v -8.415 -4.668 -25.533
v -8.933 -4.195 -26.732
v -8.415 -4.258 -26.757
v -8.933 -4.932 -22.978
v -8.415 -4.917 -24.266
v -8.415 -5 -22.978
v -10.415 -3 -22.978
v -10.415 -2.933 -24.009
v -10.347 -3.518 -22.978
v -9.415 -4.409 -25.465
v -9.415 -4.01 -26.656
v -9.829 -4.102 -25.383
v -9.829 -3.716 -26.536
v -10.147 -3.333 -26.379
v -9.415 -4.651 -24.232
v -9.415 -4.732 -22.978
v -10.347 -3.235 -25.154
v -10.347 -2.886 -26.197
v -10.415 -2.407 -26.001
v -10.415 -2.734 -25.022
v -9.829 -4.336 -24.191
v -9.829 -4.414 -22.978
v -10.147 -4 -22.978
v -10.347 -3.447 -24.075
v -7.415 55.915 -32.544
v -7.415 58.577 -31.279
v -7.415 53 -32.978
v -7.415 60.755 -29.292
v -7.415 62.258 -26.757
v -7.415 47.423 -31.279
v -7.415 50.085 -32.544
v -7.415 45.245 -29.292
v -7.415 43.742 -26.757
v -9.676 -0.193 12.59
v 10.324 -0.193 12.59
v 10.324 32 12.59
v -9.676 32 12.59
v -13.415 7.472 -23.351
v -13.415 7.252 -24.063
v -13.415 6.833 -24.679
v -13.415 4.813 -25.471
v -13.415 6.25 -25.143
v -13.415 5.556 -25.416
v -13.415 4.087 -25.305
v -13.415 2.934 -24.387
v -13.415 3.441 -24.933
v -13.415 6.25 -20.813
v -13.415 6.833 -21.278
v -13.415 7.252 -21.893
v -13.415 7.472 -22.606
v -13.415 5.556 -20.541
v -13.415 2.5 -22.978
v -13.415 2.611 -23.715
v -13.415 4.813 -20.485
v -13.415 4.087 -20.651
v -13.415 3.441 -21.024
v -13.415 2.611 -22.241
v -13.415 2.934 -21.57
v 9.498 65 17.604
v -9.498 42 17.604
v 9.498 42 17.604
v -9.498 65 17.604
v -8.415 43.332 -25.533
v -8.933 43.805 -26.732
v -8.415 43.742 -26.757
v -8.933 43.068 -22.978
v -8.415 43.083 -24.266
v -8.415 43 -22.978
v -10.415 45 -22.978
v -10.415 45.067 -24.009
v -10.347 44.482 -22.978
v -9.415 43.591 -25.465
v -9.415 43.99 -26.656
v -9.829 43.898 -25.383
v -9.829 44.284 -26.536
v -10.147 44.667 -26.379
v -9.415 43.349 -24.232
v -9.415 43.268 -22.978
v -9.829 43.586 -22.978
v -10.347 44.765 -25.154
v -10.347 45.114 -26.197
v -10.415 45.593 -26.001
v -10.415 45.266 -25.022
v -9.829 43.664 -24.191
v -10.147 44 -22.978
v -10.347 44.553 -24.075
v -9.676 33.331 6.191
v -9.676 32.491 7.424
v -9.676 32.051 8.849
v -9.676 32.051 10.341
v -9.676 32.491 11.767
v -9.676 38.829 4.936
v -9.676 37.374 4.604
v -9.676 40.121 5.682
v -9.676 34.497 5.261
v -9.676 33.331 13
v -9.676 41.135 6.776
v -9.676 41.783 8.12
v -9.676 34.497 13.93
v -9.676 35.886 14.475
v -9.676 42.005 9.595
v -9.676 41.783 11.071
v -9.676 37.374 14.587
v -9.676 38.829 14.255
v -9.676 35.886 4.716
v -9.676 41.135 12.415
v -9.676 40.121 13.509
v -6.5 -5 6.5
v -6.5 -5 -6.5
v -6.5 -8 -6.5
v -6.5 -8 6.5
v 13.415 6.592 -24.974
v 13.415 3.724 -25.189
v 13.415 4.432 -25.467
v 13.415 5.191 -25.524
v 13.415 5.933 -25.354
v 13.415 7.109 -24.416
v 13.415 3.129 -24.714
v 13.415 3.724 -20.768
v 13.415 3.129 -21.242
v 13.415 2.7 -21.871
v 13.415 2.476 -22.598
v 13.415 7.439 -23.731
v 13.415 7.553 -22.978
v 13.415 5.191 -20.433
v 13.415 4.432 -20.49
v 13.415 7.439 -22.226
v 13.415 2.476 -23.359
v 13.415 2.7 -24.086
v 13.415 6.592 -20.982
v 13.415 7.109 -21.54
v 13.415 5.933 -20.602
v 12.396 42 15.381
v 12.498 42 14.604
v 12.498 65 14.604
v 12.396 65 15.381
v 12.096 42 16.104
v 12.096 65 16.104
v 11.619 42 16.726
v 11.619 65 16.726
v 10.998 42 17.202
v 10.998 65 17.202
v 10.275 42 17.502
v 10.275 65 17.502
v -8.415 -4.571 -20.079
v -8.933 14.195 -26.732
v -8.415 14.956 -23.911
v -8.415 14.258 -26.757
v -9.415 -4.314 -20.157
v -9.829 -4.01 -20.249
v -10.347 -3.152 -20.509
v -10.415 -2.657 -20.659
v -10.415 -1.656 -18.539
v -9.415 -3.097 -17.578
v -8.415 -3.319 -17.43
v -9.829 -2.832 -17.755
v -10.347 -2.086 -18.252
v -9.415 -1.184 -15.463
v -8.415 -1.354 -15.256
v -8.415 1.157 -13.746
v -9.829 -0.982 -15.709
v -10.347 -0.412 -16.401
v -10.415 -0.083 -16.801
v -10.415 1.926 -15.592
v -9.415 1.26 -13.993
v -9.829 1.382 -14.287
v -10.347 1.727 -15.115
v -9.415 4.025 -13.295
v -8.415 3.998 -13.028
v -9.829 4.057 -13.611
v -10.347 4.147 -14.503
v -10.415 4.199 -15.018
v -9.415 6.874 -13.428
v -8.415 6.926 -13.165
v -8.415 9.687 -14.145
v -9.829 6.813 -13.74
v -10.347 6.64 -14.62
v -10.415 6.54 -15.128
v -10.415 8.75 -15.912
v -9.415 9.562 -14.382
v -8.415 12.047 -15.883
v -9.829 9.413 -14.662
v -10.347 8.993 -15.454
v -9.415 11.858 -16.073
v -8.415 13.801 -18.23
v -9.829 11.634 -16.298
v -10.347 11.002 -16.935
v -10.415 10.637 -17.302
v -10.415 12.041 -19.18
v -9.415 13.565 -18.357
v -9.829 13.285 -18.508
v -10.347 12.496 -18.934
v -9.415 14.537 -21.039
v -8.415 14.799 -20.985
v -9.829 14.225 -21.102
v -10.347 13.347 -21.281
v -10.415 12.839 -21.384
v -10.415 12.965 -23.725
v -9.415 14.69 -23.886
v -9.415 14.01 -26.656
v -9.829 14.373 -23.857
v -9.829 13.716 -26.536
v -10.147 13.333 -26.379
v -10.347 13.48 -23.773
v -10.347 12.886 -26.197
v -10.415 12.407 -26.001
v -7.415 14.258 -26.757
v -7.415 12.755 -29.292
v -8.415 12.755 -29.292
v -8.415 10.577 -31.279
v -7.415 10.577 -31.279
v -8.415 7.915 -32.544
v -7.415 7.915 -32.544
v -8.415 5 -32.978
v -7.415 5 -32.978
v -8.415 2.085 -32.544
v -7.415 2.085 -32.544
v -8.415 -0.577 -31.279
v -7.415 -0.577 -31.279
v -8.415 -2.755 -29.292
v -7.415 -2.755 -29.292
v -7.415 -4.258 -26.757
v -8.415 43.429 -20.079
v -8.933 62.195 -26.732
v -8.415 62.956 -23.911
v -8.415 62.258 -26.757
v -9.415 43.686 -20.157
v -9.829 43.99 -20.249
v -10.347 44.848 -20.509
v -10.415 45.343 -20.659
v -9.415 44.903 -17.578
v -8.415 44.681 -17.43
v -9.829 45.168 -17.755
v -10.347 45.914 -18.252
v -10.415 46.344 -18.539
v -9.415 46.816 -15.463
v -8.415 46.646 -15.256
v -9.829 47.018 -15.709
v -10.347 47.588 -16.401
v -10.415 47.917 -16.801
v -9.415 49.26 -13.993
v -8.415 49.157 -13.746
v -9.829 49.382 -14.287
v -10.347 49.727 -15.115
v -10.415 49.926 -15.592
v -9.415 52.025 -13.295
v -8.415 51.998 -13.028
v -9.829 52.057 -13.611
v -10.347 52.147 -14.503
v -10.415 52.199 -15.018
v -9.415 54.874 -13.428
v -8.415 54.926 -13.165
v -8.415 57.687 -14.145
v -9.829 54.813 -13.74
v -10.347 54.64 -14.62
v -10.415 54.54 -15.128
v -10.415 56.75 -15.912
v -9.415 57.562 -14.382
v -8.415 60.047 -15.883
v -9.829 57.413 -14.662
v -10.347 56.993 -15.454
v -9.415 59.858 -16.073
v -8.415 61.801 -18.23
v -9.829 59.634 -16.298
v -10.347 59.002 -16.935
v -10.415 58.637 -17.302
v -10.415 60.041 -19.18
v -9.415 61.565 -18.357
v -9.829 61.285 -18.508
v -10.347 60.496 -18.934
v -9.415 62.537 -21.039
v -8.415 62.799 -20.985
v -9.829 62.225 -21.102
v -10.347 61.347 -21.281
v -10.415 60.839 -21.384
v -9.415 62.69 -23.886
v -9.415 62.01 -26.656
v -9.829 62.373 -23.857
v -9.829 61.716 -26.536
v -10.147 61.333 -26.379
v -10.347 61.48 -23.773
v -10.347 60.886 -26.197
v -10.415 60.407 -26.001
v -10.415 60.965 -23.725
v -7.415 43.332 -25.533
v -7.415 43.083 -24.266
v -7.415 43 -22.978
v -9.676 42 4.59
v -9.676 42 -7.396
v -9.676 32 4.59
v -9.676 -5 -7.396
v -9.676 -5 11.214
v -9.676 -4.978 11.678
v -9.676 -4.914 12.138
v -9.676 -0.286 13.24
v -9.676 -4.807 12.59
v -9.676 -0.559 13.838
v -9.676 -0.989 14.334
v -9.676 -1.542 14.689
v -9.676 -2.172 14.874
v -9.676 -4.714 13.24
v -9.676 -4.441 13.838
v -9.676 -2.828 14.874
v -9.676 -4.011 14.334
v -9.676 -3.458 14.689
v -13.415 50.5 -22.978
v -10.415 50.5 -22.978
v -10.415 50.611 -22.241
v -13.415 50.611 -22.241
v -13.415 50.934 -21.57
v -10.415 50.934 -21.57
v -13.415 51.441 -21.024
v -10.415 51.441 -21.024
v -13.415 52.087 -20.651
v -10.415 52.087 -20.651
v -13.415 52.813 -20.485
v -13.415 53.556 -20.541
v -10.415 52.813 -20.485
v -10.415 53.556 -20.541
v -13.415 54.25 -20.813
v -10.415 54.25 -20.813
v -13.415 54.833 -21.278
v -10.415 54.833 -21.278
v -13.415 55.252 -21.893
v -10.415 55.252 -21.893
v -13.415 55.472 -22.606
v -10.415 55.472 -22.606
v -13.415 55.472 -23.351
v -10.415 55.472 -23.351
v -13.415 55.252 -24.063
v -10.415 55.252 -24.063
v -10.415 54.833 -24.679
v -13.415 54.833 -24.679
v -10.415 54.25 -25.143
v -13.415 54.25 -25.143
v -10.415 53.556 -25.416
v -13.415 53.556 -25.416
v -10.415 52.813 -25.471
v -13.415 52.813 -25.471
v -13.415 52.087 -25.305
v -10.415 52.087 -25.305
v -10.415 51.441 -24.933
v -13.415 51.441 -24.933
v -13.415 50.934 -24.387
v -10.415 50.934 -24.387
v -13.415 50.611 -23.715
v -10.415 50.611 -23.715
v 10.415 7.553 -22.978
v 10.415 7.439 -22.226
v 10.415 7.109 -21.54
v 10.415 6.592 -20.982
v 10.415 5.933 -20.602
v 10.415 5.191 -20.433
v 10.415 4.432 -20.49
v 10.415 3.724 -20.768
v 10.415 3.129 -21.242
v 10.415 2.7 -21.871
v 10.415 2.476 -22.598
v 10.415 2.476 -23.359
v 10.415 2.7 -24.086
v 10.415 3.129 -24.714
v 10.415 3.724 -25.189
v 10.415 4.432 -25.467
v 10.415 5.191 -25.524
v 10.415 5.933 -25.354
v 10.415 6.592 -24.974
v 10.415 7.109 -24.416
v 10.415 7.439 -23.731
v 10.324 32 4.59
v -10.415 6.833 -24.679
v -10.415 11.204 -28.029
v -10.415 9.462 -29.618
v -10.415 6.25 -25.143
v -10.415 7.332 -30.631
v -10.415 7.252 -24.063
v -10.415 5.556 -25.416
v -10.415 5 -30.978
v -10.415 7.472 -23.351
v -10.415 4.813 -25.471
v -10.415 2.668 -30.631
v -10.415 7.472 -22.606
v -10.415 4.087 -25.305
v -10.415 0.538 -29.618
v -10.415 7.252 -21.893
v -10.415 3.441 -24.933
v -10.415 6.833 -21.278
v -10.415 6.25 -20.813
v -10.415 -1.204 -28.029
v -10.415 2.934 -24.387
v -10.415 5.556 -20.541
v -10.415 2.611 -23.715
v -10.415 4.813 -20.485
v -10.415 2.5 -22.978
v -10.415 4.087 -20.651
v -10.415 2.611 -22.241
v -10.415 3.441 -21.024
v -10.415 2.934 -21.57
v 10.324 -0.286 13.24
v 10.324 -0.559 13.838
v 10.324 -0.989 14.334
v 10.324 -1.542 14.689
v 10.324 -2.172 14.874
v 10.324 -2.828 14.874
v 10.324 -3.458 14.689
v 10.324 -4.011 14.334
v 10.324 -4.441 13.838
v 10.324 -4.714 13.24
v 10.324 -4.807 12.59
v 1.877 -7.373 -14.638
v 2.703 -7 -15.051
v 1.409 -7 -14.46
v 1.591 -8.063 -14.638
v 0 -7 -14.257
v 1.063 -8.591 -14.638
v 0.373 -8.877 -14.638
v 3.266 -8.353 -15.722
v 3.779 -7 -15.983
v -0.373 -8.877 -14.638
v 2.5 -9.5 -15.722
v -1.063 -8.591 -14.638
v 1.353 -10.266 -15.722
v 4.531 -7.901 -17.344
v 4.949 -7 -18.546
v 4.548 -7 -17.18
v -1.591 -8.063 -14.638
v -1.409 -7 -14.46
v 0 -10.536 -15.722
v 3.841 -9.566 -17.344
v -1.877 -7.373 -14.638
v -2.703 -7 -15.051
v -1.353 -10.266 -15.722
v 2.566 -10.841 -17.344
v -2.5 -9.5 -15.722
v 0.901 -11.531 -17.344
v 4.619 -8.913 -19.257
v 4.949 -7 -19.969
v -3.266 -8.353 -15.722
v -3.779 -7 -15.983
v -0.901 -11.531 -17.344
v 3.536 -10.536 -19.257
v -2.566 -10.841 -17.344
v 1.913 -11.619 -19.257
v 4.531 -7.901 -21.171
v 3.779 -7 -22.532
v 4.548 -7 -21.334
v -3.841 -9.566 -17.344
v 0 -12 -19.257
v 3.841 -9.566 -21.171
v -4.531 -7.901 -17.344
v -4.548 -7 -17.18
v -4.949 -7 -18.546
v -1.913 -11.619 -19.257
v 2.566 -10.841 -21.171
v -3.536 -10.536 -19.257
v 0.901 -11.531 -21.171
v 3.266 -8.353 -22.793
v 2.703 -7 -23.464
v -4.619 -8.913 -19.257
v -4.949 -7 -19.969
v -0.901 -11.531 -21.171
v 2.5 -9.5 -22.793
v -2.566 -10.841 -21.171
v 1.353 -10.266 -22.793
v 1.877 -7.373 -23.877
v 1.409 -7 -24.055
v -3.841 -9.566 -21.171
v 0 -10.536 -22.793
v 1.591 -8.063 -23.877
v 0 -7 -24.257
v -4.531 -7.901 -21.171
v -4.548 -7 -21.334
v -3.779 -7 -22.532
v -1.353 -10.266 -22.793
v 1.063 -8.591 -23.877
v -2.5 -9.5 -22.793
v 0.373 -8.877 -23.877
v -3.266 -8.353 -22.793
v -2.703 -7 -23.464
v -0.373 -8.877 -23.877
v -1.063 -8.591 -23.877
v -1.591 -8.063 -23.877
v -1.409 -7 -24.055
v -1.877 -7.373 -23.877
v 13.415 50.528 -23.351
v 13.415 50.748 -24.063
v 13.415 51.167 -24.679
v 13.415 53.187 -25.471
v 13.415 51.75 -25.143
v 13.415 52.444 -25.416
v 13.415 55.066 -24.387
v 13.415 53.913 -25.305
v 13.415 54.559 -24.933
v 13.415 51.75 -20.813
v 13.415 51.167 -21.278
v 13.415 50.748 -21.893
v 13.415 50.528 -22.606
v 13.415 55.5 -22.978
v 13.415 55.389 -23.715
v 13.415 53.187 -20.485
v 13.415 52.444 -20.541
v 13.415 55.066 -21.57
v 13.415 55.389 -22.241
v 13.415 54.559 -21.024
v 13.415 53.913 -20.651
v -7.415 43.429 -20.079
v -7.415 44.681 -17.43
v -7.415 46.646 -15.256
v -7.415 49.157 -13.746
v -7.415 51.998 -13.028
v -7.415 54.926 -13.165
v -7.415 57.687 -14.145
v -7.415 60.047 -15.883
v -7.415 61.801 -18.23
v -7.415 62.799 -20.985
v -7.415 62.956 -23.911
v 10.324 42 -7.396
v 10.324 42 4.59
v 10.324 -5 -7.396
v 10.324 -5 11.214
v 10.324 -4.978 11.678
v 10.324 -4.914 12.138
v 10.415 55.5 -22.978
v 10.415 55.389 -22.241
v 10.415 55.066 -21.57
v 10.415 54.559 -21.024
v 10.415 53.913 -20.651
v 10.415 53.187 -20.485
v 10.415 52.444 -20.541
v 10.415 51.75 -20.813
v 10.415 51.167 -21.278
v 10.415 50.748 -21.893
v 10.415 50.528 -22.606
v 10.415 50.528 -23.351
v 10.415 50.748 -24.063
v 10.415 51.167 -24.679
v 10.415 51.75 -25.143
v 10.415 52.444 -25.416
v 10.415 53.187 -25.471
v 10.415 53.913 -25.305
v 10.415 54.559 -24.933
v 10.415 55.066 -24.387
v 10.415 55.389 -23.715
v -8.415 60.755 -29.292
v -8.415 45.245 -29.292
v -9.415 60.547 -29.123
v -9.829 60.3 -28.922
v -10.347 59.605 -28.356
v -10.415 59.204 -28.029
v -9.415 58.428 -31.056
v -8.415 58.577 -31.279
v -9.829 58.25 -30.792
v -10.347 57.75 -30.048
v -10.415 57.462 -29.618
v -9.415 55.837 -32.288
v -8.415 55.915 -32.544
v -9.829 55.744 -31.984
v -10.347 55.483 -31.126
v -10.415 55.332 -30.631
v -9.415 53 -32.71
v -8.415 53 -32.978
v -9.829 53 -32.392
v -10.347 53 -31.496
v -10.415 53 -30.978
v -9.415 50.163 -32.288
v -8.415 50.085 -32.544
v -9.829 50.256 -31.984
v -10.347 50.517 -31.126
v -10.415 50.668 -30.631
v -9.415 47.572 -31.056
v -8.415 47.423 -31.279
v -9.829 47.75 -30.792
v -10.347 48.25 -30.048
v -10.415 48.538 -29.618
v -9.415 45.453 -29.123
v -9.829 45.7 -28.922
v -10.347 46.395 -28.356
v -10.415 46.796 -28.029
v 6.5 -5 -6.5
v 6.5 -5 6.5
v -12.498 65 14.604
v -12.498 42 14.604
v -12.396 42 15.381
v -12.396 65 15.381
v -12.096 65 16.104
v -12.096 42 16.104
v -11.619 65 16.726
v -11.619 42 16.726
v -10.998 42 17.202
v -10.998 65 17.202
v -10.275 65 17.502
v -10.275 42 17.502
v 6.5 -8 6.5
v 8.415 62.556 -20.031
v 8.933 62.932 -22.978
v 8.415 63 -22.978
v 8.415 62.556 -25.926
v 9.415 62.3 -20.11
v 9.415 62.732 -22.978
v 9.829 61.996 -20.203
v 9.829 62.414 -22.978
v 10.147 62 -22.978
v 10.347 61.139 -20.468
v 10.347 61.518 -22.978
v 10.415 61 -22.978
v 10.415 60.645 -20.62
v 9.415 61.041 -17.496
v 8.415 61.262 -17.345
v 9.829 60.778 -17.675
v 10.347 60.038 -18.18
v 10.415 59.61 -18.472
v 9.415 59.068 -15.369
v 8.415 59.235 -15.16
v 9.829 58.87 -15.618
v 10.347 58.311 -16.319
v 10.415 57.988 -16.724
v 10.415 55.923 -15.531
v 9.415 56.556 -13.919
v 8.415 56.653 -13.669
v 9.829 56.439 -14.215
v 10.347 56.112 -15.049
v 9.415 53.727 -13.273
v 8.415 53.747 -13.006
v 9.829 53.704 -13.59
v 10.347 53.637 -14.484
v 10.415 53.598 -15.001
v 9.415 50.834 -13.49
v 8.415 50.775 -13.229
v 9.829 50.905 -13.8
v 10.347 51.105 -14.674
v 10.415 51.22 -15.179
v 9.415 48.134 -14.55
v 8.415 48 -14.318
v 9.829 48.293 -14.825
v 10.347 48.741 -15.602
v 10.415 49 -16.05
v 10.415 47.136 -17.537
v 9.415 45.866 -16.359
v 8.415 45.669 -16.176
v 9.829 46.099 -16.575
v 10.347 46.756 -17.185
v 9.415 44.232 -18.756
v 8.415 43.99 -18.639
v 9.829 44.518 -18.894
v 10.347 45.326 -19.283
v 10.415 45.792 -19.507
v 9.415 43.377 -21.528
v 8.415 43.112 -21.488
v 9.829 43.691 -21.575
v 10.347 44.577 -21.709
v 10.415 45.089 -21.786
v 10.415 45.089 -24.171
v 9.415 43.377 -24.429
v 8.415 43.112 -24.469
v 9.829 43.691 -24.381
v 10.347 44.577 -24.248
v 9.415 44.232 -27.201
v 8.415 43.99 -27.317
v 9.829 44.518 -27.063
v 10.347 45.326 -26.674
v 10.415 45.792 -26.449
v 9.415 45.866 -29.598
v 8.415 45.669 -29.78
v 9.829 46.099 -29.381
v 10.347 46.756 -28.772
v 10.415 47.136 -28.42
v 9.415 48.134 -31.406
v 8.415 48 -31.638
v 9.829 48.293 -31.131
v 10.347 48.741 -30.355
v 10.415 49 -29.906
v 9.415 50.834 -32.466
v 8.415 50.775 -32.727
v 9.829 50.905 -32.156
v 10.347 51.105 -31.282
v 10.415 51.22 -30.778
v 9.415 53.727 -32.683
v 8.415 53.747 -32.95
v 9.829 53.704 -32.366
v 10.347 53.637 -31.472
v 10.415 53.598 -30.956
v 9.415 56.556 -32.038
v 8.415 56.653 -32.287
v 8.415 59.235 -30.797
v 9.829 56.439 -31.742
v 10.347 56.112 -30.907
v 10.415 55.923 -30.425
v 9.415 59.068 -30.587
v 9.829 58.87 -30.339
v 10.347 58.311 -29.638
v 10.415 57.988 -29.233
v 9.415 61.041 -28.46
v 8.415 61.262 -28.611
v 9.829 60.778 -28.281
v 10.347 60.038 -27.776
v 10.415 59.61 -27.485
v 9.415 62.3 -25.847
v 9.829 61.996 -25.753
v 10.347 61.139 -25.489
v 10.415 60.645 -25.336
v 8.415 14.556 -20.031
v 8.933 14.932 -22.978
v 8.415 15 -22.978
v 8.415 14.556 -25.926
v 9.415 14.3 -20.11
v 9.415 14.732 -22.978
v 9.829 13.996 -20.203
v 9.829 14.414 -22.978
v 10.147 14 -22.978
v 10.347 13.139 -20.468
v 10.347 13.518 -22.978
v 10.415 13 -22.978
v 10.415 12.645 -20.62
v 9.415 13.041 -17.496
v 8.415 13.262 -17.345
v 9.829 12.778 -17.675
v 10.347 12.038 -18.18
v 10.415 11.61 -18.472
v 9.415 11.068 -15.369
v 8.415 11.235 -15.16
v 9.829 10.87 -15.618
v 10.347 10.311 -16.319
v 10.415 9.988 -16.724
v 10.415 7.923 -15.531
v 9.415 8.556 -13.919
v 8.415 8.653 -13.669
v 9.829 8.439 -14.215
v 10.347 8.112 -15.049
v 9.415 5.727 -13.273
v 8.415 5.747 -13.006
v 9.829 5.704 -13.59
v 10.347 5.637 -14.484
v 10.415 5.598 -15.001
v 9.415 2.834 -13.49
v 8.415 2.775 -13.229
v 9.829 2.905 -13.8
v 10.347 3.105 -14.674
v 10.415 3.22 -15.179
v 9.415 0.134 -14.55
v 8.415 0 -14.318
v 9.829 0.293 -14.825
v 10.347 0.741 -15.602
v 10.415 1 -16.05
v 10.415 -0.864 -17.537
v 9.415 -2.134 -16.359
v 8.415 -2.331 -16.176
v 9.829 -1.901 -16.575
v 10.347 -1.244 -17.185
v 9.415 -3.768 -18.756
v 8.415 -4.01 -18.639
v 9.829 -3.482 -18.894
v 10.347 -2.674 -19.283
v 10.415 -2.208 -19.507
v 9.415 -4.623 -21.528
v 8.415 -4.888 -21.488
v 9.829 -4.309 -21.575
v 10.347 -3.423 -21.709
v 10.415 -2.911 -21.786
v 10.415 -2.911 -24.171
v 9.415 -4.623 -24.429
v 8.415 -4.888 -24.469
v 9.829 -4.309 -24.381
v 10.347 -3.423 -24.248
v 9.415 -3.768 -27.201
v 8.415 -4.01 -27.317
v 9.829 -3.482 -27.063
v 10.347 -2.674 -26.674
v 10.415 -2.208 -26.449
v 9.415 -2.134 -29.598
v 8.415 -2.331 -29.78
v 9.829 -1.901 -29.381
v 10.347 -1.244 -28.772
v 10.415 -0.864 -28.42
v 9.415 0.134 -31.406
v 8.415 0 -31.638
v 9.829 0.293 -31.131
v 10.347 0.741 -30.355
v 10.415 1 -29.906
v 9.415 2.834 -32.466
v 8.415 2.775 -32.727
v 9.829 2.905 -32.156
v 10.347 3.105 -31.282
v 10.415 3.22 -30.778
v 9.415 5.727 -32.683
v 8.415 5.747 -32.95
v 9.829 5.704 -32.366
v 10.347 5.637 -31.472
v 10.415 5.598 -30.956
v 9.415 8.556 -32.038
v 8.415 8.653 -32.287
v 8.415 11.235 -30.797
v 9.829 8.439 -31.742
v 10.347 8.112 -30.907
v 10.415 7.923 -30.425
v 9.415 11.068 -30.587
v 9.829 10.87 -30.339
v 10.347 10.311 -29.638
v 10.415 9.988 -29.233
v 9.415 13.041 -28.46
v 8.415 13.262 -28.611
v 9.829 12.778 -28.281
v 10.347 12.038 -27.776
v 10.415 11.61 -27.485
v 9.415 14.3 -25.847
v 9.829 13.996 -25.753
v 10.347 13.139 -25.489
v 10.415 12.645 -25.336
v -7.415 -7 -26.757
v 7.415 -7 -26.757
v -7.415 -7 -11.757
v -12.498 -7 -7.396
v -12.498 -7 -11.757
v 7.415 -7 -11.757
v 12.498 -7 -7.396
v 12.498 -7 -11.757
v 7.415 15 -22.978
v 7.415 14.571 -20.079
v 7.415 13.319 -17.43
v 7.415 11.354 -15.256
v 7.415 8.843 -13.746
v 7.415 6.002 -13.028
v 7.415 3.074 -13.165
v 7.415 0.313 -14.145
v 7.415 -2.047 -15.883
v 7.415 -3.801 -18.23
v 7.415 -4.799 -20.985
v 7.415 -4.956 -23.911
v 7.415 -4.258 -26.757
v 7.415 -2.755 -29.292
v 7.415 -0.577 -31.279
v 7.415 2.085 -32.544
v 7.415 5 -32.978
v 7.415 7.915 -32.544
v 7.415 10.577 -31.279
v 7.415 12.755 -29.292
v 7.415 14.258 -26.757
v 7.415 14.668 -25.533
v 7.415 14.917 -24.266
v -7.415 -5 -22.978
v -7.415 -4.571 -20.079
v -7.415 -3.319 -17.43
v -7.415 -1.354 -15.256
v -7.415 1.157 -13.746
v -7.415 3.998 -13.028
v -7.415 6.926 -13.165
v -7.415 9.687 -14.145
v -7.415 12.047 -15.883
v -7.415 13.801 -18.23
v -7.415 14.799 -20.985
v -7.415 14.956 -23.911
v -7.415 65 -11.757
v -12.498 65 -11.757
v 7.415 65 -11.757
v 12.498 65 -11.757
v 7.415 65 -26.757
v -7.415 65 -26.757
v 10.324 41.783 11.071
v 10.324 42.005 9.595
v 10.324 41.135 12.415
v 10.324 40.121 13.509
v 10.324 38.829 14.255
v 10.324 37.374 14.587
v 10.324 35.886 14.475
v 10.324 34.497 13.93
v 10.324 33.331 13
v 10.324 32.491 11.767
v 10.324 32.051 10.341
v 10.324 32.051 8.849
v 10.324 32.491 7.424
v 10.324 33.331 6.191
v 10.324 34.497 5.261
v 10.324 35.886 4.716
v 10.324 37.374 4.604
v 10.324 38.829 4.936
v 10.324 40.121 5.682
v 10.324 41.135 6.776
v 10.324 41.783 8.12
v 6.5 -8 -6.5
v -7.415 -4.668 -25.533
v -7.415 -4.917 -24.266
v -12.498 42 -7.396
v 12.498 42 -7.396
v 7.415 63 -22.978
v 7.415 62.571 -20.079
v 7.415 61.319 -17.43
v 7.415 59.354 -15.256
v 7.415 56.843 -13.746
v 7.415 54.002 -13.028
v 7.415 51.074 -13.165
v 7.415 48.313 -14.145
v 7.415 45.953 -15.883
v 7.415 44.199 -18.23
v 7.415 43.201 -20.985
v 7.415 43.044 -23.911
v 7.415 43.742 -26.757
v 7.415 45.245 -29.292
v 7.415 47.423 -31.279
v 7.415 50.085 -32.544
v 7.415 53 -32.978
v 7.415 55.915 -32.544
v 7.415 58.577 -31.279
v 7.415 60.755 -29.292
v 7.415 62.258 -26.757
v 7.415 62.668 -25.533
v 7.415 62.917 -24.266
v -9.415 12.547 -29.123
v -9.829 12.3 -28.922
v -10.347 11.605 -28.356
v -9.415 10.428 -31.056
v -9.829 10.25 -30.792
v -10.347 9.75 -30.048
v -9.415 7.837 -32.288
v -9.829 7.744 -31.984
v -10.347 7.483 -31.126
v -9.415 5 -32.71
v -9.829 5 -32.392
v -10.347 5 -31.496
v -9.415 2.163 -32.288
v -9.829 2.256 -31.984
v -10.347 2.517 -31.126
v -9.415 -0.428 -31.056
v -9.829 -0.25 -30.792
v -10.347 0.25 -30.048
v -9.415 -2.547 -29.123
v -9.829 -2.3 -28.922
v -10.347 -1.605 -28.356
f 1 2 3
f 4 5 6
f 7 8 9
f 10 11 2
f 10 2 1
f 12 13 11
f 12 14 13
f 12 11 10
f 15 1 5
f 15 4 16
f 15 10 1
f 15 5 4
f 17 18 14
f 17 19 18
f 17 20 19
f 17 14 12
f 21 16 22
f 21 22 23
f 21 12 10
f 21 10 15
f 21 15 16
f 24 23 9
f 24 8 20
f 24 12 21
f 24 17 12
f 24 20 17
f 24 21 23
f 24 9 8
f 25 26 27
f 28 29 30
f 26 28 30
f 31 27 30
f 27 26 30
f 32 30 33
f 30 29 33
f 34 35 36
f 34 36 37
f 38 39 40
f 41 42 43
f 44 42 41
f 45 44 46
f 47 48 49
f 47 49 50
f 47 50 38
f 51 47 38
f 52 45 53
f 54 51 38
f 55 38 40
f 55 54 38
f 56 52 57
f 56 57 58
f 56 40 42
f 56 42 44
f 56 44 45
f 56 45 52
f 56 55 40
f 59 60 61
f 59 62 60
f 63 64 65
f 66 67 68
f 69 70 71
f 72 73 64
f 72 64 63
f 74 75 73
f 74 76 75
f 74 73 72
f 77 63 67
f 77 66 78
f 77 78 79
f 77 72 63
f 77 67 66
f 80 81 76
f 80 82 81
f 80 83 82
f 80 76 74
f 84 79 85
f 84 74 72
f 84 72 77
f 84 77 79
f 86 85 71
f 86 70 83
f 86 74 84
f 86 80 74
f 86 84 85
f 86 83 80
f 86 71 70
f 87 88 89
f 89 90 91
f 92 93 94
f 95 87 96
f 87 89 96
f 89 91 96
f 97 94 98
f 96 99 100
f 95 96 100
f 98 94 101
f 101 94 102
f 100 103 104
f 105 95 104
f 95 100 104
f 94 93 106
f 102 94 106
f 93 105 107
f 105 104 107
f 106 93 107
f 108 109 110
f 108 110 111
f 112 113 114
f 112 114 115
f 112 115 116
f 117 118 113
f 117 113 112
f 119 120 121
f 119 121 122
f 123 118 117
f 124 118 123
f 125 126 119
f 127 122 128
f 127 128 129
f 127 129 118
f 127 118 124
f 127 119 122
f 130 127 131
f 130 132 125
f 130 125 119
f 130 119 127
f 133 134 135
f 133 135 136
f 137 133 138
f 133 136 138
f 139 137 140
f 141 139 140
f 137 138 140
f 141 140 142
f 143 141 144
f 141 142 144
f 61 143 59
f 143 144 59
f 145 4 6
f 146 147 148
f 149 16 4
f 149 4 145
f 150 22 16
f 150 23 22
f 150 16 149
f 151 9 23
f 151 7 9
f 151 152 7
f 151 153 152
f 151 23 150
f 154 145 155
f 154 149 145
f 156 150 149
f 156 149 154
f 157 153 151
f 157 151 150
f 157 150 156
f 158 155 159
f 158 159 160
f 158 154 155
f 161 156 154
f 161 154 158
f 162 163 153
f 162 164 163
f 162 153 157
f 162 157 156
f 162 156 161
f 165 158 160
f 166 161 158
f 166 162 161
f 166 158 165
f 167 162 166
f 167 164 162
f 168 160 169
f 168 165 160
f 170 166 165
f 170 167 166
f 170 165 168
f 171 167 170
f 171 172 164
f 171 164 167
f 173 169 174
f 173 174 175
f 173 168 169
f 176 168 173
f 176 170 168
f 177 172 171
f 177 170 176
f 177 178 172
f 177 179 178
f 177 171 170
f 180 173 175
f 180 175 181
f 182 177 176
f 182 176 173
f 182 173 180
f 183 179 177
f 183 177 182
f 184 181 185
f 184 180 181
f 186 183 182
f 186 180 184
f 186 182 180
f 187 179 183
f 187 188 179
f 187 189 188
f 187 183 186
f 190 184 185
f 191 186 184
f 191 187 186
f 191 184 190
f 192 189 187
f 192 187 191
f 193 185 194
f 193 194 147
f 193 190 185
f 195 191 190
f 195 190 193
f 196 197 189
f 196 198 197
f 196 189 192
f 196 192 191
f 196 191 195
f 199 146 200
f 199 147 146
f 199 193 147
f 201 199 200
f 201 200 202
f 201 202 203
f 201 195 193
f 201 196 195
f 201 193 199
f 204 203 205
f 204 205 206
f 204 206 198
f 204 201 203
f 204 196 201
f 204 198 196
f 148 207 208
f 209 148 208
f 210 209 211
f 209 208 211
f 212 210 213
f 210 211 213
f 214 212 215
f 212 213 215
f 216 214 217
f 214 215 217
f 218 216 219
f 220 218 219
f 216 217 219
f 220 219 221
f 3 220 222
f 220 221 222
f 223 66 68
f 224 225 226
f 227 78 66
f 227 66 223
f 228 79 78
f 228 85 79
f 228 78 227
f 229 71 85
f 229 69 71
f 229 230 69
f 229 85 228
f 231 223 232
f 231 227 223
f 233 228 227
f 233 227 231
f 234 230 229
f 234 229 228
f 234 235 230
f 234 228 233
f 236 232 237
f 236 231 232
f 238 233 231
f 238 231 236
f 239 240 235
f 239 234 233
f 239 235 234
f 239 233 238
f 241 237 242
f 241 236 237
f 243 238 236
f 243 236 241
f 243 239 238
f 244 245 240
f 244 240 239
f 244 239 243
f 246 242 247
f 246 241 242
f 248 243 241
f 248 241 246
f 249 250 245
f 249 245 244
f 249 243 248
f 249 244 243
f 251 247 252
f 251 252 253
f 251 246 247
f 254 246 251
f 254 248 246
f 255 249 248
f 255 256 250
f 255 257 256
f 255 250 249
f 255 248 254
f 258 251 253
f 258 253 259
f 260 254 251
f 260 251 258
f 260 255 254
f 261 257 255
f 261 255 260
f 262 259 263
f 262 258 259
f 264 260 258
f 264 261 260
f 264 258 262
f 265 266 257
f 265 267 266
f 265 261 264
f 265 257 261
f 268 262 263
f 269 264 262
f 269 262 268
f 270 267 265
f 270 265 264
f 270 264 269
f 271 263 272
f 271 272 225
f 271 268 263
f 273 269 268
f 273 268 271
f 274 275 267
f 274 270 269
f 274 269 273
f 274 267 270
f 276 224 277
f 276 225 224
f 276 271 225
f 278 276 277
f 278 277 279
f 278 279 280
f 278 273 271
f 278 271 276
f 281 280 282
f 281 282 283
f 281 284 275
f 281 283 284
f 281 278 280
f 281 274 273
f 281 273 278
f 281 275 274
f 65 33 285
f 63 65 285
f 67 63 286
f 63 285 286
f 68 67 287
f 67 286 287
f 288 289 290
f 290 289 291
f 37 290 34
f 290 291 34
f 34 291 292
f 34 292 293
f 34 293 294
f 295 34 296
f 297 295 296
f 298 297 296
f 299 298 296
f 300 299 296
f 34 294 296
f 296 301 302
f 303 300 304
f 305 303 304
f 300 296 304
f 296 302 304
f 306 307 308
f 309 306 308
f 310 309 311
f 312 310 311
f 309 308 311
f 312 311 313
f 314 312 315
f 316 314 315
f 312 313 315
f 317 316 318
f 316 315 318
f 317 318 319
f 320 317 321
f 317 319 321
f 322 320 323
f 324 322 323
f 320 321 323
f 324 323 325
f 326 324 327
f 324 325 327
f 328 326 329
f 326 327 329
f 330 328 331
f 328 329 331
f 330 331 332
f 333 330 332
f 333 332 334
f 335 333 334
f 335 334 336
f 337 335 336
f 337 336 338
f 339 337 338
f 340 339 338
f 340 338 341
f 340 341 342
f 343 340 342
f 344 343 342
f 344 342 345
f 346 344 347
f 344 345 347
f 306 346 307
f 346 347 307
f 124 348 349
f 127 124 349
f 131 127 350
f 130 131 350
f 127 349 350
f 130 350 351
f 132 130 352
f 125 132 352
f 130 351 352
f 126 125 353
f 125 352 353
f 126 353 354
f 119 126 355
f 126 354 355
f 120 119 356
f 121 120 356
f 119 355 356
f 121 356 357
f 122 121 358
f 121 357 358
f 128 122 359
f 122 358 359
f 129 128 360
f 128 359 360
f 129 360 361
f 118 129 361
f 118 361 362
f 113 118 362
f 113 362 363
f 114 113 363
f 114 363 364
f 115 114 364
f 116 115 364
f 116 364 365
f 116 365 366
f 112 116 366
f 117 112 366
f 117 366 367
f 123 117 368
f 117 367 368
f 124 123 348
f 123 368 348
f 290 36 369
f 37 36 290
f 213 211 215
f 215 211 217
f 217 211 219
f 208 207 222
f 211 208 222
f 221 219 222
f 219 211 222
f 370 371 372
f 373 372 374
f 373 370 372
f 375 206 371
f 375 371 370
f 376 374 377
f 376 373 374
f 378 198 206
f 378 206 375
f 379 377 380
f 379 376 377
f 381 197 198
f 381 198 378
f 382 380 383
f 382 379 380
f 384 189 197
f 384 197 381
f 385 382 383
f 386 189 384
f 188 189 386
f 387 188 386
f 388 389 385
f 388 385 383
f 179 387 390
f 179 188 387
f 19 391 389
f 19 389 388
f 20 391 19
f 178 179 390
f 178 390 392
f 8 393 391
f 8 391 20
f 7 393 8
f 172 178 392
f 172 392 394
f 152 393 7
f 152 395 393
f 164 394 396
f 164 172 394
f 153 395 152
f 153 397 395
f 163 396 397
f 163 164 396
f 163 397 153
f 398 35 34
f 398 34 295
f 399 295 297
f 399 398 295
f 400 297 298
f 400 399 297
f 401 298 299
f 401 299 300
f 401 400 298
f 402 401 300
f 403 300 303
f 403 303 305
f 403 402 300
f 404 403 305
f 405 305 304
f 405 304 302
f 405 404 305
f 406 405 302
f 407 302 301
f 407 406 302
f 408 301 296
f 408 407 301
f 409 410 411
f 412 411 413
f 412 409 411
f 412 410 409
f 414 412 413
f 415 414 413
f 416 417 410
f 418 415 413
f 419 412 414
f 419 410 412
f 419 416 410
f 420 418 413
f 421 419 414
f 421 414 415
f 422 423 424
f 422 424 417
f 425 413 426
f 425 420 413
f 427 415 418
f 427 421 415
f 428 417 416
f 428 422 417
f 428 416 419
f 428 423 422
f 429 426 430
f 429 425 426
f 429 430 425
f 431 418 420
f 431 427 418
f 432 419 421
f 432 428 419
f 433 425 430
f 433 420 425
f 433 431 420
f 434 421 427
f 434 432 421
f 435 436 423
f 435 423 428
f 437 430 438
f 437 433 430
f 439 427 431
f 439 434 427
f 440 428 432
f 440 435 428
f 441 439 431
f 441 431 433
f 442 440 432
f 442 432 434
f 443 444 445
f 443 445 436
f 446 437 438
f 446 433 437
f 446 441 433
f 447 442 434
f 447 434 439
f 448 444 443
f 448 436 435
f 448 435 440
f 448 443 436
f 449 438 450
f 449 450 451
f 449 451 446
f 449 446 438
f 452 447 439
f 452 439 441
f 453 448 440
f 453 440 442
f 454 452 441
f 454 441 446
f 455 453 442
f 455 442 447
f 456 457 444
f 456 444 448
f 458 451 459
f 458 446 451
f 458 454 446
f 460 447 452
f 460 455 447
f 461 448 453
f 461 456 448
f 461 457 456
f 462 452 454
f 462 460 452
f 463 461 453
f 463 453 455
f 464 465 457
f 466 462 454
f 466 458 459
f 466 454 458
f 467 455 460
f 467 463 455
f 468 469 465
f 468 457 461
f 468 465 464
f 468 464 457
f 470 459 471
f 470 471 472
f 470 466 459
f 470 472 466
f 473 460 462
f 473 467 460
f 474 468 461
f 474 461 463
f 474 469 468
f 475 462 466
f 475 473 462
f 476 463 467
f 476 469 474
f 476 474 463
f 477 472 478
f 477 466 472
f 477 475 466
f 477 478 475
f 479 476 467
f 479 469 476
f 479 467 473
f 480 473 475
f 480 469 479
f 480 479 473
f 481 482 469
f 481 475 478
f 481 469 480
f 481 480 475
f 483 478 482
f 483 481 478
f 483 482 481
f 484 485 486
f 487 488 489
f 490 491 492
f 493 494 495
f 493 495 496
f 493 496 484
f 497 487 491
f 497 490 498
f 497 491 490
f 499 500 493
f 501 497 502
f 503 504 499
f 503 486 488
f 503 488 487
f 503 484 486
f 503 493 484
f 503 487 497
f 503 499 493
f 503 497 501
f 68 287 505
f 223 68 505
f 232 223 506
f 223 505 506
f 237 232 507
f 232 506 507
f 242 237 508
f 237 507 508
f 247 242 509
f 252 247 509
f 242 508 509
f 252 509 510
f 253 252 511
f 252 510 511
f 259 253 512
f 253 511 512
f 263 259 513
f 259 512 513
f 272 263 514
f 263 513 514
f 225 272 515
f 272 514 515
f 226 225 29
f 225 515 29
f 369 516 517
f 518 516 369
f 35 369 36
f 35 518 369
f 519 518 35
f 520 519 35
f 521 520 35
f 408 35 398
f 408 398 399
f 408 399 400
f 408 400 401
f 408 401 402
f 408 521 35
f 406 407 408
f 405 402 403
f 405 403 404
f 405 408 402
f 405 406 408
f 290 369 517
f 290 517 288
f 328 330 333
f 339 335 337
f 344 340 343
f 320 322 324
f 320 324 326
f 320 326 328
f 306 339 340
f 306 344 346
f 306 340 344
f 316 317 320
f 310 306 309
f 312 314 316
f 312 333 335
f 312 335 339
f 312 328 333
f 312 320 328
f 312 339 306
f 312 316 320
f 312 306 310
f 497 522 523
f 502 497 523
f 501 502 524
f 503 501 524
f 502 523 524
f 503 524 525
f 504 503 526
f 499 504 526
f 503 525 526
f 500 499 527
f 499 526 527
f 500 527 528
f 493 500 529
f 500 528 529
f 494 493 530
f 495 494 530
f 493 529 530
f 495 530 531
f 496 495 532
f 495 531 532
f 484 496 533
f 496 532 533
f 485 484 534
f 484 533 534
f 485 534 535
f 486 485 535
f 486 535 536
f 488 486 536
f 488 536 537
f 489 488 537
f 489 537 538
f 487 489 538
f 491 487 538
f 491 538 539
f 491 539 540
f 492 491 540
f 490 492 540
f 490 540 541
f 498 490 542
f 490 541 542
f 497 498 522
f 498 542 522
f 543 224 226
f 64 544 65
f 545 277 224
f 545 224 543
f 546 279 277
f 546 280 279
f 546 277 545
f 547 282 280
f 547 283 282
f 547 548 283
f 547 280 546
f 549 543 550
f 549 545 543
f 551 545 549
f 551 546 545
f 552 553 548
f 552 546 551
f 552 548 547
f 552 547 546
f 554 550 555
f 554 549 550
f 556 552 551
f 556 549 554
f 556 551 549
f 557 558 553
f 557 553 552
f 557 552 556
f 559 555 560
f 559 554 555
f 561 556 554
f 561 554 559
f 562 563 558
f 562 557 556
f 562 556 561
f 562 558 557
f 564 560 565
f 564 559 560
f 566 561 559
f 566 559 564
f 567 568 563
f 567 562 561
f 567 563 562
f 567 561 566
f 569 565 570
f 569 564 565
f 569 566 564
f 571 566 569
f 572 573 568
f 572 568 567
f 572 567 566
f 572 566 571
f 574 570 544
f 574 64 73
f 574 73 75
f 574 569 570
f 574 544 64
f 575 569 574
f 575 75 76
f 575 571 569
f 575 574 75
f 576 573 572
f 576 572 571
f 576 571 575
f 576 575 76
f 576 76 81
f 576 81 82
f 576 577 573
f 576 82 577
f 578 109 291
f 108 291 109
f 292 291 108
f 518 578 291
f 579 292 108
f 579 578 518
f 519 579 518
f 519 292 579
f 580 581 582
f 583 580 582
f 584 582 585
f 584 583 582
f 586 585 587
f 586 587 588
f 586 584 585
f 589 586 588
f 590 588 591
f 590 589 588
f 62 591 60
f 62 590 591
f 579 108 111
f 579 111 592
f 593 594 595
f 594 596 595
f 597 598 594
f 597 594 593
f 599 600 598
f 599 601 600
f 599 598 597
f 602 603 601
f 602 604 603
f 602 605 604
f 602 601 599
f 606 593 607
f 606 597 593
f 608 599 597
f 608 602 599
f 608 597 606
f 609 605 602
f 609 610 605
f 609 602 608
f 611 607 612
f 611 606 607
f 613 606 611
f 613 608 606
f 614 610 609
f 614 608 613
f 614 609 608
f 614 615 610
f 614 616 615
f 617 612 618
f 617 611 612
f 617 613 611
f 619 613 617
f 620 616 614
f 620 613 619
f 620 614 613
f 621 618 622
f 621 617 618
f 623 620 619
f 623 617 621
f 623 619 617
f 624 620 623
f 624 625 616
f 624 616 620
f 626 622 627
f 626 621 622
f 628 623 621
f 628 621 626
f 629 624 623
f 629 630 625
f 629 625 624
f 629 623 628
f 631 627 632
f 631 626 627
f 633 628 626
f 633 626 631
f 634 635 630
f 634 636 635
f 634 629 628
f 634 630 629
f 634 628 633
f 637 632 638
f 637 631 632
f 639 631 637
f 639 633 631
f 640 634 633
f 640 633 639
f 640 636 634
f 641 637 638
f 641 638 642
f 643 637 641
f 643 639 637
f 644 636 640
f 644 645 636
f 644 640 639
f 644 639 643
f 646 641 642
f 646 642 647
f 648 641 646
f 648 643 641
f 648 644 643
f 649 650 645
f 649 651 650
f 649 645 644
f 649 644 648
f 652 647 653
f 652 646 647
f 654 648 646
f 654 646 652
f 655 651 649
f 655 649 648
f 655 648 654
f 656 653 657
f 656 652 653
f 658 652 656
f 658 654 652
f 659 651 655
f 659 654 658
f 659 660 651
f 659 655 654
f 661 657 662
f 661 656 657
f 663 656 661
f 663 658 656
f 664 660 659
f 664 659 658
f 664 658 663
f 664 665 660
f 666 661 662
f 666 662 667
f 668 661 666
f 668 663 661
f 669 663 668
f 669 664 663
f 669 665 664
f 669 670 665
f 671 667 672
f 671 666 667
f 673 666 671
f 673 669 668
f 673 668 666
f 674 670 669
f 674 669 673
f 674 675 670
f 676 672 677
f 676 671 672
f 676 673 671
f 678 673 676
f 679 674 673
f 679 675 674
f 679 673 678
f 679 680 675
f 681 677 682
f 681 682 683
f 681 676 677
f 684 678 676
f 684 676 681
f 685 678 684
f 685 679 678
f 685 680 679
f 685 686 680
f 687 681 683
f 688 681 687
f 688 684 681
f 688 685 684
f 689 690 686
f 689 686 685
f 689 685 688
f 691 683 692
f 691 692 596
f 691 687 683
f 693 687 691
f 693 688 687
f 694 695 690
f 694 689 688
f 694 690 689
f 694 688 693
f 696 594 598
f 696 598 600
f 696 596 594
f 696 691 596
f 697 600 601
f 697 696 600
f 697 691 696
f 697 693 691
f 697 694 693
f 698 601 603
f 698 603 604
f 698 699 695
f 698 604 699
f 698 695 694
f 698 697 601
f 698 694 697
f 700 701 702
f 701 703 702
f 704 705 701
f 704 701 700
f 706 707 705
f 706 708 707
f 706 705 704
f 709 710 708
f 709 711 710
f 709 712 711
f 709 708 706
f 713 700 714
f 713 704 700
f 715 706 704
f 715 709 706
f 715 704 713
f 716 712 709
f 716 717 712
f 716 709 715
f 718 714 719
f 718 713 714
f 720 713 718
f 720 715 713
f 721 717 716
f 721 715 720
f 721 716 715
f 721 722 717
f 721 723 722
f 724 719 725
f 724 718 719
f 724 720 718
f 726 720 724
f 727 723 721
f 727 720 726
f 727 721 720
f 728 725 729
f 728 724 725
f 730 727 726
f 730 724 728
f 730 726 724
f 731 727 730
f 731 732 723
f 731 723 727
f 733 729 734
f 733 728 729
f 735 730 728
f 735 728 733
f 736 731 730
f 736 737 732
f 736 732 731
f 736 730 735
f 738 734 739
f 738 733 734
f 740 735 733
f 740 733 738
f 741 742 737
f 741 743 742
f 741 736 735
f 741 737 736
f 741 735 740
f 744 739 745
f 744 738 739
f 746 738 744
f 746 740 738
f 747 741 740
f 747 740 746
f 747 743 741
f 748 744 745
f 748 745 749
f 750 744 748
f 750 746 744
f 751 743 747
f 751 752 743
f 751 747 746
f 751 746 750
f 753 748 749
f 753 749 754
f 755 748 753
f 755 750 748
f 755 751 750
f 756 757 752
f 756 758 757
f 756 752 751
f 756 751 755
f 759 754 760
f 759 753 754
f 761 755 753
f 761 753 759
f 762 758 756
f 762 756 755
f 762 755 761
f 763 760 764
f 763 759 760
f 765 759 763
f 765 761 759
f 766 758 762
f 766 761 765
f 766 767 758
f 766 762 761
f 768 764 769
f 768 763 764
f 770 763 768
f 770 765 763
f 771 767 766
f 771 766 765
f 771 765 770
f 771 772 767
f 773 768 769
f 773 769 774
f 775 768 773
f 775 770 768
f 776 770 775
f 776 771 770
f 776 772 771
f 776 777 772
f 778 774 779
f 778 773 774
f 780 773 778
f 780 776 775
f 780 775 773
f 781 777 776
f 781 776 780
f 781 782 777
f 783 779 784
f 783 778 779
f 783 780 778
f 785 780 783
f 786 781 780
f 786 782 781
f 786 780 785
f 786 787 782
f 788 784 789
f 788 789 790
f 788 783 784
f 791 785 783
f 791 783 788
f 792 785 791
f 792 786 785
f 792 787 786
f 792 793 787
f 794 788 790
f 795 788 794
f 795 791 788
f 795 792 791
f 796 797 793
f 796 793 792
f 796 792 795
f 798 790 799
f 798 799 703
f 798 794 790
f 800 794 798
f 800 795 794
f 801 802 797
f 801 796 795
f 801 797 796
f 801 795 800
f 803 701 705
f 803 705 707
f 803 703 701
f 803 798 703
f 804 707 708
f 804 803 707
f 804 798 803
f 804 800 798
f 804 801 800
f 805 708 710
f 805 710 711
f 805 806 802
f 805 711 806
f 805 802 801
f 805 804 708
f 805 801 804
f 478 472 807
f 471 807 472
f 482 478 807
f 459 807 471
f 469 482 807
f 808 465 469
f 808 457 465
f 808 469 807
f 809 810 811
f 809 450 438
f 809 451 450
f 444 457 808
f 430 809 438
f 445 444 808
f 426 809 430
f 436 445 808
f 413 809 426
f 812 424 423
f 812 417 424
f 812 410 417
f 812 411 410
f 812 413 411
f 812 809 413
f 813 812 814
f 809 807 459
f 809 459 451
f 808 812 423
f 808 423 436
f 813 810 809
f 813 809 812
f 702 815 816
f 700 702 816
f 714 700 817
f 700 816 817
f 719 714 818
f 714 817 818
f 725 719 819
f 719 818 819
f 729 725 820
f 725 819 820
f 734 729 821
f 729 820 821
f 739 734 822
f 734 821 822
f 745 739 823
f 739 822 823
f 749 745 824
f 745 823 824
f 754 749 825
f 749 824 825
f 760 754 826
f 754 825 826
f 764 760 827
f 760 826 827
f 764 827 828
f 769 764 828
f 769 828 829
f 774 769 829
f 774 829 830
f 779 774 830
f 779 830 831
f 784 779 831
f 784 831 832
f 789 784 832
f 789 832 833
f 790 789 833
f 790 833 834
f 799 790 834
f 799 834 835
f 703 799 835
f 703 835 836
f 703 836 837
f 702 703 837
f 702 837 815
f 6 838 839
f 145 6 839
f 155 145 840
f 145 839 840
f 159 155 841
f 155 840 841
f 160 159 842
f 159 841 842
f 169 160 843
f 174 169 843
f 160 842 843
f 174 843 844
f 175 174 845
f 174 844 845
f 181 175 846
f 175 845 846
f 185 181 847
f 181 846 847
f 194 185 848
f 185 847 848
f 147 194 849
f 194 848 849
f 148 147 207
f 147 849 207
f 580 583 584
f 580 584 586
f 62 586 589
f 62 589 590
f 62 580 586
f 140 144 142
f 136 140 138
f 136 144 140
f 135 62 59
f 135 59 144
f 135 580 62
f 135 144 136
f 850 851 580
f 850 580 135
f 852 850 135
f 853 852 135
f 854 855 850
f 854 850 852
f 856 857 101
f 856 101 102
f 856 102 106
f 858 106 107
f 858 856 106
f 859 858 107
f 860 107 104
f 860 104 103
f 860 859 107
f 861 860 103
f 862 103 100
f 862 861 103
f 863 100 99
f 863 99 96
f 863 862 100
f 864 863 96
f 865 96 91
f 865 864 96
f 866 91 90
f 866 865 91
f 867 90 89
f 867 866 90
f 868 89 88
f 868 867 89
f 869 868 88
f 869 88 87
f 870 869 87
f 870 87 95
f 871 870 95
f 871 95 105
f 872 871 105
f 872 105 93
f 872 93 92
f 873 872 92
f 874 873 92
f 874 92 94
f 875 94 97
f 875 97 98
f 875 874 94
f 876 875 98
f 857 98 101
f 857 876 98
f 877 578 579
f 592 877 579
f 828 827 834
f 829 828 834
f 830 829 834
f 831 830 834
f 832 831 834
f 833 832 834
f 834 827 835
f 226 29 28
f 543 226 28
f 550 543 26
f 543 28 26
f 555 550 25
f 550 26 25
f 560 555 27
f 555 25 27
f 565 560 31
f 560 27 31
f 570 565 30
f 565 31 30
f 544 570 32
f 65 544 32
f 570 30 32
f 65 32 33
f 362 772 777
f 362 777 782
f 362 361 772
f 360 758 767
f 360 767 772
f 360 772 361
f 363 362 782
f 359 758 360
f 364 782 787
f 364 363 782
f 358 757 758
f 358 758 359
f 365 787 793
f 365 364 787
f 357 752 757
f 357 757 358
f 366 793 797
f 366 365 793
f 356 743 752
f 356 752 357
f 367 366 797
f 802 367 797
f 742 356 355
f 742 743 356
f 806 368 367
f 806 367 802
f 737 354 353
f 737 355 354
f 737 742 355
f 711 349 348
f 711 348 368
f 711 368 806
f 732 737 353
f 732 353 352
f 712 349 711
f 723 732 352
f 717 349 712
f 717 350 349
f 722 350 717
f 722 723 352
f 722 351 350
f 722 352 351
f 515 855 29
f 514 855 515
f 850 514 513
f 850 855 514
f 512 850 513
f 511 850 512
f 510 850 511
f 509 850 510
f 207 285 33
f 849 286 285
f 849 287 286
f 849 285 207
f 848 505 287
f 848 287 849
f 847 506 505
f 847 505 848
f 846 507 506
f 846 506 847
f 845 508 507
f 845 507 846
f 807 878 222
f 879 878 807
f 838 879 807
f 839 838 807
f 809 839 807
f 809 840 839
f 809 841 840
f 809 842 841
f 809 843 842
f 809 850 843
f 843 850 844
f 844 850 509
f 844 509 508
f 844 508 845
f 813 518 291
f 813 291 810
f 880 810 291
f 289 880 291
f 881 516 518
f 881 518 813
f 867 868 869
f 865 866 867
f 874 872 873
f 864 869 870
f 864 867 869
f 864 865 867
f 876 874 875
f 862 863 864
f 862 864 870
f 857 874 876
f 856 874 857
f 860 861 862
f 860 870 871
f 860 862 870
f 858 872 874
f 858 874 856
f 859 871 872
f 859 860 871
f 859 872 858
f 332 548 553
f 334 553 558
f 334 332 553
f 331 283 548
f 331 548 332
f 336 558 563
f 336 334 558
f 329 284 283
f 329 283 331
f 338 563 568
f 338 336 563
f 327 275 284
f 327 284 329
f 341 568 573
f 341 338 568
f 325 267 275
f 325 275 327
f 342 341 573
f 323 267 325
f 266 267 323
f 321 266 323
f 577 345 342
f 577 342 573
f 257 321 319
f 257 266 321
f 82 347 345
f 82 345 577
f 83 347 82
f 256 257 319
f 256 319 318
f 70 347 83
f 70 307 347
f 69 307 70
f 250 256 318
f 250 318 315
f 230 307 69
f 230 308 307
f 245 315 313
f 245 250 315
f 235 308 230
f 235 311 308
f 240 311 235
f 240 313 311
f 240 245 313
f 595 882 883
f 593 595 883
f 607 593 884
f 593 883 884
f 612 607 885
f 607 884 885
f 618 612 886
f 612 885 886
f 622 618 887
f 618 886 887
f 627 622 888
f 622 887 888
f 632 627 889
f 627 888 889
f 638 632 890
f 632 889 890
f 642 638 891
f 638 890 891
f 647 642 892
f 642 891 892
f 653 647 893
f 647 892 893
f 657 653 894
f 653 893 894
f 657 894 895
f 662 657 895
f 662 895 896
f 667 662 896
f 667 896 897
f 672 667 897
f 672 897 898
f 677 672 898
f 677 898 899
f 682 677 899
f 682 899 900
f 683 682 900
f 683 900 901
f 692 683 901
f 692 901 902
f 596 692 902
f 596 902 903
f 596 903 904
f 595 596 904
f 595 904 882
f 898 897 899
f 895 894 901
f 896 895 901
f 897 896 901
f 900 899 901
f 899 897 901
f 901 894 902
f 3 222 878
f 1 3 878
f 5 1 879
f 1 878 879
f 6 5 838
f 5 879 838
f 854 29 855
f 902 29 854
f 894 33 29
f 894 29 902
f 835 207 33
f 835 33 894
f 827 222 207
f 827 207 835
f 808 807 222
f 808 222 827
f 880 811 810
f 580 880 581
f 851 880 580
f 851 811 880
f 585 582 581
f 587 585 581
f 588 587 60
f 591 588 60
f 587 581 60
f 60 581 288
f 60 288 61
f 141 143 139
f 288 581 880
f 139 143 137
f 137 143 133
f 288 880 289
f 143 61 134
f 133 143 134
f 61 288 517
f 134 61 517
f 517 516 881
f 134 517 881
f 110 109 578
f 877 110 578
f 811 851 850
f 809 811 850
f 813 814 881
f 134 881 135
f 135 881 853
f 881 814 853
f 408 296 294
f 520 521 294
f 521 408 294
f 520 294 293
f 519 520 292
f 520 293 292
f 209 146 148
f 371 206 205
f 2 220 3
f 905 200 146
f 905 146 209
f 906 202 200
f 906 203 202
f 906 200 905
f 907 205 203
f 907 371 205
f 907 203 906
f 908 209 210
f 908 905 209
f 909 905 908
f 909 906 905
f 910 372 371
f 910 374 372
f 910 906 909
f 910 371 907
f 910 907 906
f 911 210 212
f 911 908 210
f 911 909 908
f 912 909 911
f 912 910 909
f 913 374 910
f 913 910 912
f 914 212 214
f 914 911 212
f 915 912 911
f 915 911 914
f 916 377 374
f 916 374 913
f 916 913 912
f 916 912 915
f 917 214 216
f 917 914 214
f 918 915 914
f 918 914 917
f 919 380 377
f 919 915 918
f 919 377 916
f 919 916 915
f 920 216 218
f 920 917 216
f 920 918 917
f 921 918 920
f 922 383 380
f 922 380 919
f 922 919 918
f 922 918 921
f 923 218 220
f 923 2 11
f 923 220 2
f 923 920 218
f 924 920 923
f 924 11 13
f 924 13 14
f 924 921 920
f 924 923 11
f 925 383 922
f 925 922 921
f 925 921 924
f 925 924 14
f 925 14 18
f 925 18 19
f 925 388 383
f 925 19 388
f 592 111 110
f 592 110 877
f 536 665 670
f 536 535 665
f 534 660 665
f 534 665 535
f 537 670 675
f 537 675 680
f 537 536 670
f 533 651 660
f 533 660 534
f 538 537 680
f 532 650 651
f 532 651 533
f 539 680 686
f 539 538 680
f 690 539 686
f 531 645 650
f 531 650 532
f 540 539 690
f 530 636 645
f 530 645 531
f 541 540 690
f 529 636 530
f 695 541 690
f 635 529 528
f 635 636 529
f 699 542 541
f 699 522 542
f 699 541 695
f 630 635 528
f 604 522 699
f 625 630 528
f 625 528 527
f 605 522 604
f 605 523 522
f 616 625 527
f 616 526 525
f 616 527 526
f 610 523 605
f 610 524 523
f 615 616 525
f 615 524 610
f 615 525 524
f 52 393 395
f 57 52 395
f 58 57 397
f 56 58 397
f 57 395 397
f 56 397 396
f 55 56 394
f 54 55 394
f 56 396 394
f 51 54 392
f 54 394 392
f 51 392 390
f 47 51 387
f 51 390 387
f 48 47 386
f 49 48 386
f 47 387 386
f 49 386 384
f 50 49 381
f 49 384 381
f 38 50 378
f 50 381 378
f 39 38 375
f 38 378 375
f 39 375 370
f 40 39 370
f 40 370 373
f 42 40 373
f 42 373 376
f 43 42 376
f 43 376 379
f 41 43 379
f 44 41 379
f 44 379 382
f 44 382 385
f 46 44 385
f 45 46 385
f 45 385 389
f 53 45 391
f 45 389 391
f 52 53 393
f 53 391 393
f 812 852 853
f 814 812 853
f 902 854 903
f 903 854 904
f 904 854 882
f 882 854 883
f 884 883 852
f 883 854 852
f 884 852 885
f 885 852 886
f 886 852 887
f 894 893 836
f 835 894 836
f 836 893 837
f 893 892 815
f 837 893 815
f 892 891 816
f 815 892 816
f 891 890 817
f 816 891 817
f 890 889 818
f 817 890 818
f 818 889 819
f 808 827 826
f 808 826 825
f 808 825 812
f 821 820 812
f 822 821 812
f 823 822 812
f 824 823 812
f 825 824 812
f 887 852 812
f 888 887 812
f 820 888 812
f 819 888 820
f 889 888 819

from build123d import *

# Parameters (mm, degrees)
F0_W         = 20
F0_H         = 20
F1_DEPTH     = 5
F2_W         = 20
F2_H         = 8
F3_DEPTH     = 27
F4_W         = 20
F4_H         = 12
F5_DEPTH     = 37
F6_W         = 24.9961130321
F6_H         = 4.3615074828
F7_DEPTH     = 65
F8_W         = 24.9961130321
F8_H         = 4.3615074828
F9_DEPTH     = 7
F10_W        = 24.9961130321
F10_H        = 23
F11_DEPTH    = 25
F12_R        = 5.00513233
F13_DEPTH    = 20
F14_W        = 14.829759486
F14_H        = 72
F15_DEPTH    = 15
F17_DEPTH    = 20
F18_T1_DEPTH = 26.8793659776
F19_R        = 10
F20_DEPTH    = 3
F22_DEPTH    = 3
F25_R        = 2.5526009998
F26_DEPTH    = 3
F27_R        = 2.5
F28_DEPTH    = 3
F29_R        = 2.5
F30_DEPTH    = 3
F31_R        = 2.5
F32_DEPTH    = 3
F33_R        = 2
F34_R        = 3
F35_W        = 13
F35_H        = 13
F36_DEPTH    = 3


# Not quite as in the source:
# - a fillet or chamfer that OpenCascade refuses, or shapes differently, is made with other operations: its cross-section is extruded or revolved along the edge and cut away or added


with BuildPart() as f1:
    # F0 (on Front) → F1 (new body, symmetric)
    with BuildSketch(Plane.XZ):
        with Locations((0.3240229562, 2.5902625751)):
            Rectangle(F0_W, F0_H)
    extrude(amount=F1_DEPTH, both=True)

    # F2 (on face) → F3 (join)
    with BuildSketch(Plane(origin=(0, 5, 0), x_dir=(-1, 0, 0), z_dir=(0, 1, 0))):
        with Locations((-0.3240229562, 8.5902625751)):
            Rectangle(F2_W, F2_H)
    extrude(amount=F3_DEPTH)

    # F4 (on face) → F5 (join)
    with BuildSketch(Plane(origin=(0, 5, 0), x_dir=(-1, 0, 0), z_dir=(0, 1, 0))):
        with Locations((-0.3240229562, -1.4097374249)):
            Rectangle(F4_W, F4_H)
    extrude(amount=F5_DEPTH)

    # F6 (on Front) → F7 (join)
    with BuildSketch(Plane.XZ):
        with Locations((0, -9.5765283331)):
            Rectangle(F6_W, F6_H)
    extrude(amount=-F7_DEPTH)

    # F8 (on face) → F9 (join)
    with BuildSketch(Plane.XZ):
        with Locations((0, -9.5765283331)):
            Rectangle(F8_W, F8_H)
    extrude(amount=F9_DEPTH)

    # F10 (on face) → F11 (join)
    with BuildSketch(Plane.XY.offset(-7.3957745917)):
        with Locations((0, 53.5)):
            Rectangle(F10_W, F10_H)
    extrude(amount=F11_DEPTH)

    # F14 (on face) → F15 (join)
    with BuildSketch(Plane(origin=(0, 0, -11.7572820745), x_dir=(1, 0, 0), z_dir=(0, 0, -1))):
        with Locations((0, -29)):
            Rectangle(F14_W, F14_H)
    extrude(amount=F15_DEPTH)

    # F16 (on face) → F17 (join)
    with BuildSketch(Plane.YZ.offset(10.3240229562)):
        with BuildLine():
            ThreePointArc((-0.1930287134, 12.5902625751), (-2.5, 14.8972338617), (-4.8069712866, 12.5902625751))
            Line((-4.8069712866, 12.5902625751), (-0.1930287134, 12.5902625751))
        make_face()
    extrude(amount=-F17_DEPTH)

    # F18: fillet of radius 5 on 1 edges, made by hand

    # F18_s2 → F18_t1 (cut)
    with BuildSketch(Plane.YZ.offset(-13.1156600326)):
        with BuildLine():
            ThreePointArc((-4.8069712866, 12.5902625751), (-4.951507671, 11.9090632481), (-5, 11.2143893796))
            Line((-5, 11.2143893796), (-5, 12.5902625751))
            Line((-5, 12.5902625751), (-4.8069712866, 12.5902625751))
        make_face()
    extrude(amount=F18_T1_DEPTH, mode=Mode.SUBTRACT)

    # F19 (on face) → F20 (join)
    with BuildSketch(Plane.YZ.offset(7.414879743)):
        with Locations((5, -22.9782015085)):
            Circle(F19_R)
        with Locations((53, -22.9782015085)):
            Circle(F19_R)
    extrude(amount=F20_DEPTH)

    # F21 (on face) → F22 (join)
    with BuildSketch(Plane(origin=(-7.414879743, 0, 0), x_dir=(0, -1, 0), z_dir=(-1, 0, 0))):
        with BuildLine():
            ThreePointArc((-43, -22.9782015085), (-54.9255761518, -13.1653448152), (-62.2584312967, -26.7572820745))
            ThreePointArc((-62.2584312967, -26.7572820745), (-53, -32.9782015085), (-43.7415687033, -26.7572820745))
            ThreePointArc((-43.7415687033, -26.7572820745), (-43.1871433067, -24.9037776604), (-43, -22.9782015085))
        make_face()
        with BuildLine():
            ThreePointArc((5, -22.9782015085), (-6.9255761518, -13.1653448152), (-14.2584312967, -26.7572820745))
            ThreePointArc((-14.2584312967, -26.7572820745), (-5, -32.9782015085), (4.2584312967, -26.7572820745))
            ThreePointArc((4.2584312967, -26.7572820745), (4.8128566933, -24.9037776604), (5, -22.9782015085))
        make_face()
    extrude(amount=F22_DEPTH)

    # F23 (on face) → F24 (revolve)
    with BuildSketch(Plane.XZ.offset(7)):
        with BuildLine():
            Line((0, -24.2572820745), (0, -14.2572820745))
            ThreePointArc((0, -14.2572820745), (-5, -19.2572820745), (0, -24.2572820745))
        make_face()
    revolve(axis=Axis((0, -7, -19.2572820745), (0, 0, -1)))

    # F25 (on face) → F26 (join)
    with BuildSketch(Plane.YZ.offset(10.414879743)):
        with Locations((5, -22.9782015085)):
            Circle(F25_R)
    extrude(amount=F26_DEPTH)

    # F27 (on face) → F28 (join)
    with BuildSketch(Plane.YZ.offset(10.414879743)):
        with Locations((53, -22.9782015085)):
            Circle(F27_R)
    extrude(amount=F28_DEPTH)

    # F29 (on face) → F30 (join)
    with BuildSketch(Plane(origin=(-10.414879743, 0, 0), x_dir=(0, -1, 0), z_dir=(-1, 0, 0))):
        with Locations((-5, -22.9782015085)):
            Circle(F29_R)
    extrude(amount=F30_DEPTH)

    # F31 (on face) → F32 (join)
    with BuildSketch(Plane(origin=(-10.414879743, 0, 0), x_dir=(0, -1, 0), z_dir=(-1, 0, 0))):
        with Locations((-53, -22.9782015085)):
            Circle(F31_R)
    extrude(amount=F32_DEPTH)

    # F33
    f33_edges = [f1.edges().sort_by_distance(p)[0] for p in [
        (-10.41488, 63, -22.978202),
        (-10.41488, 15, -22.978202),
        (10.41488, 43, -22.978202),
        (10.41488, -5, -22.978202),
    ]]
    fillet(f33_edges, radius=F33_R)

    # F34
    f34_edges = [f1.edges().sort_by_distance(p)[0] for p in [
        (12.498057, 53.5, 17.604225),
        (-12.498057, 53.5, 17.604225),
    ]]
    fillet(f34_edges, radius=F34_R)

    # F35 (on face) → F36 (join)
    with BuildSketch(Plane.XZ.offset(5)):
        Rectangle(F35_W, F35_H)
    extrude(amount=F36_DEPTH)


with BuildPart() as f13:
    # F12 (on face) → F13 (new body)
    with BuildSketch(Plane.YZ.offset(10.3240229562)):
        with Locations((37, 9.5953949051)):
            Circle(F12_R)
    extrude(amount=-F13_DEPTH)


solid = Compound([f1.part, f13.part])
